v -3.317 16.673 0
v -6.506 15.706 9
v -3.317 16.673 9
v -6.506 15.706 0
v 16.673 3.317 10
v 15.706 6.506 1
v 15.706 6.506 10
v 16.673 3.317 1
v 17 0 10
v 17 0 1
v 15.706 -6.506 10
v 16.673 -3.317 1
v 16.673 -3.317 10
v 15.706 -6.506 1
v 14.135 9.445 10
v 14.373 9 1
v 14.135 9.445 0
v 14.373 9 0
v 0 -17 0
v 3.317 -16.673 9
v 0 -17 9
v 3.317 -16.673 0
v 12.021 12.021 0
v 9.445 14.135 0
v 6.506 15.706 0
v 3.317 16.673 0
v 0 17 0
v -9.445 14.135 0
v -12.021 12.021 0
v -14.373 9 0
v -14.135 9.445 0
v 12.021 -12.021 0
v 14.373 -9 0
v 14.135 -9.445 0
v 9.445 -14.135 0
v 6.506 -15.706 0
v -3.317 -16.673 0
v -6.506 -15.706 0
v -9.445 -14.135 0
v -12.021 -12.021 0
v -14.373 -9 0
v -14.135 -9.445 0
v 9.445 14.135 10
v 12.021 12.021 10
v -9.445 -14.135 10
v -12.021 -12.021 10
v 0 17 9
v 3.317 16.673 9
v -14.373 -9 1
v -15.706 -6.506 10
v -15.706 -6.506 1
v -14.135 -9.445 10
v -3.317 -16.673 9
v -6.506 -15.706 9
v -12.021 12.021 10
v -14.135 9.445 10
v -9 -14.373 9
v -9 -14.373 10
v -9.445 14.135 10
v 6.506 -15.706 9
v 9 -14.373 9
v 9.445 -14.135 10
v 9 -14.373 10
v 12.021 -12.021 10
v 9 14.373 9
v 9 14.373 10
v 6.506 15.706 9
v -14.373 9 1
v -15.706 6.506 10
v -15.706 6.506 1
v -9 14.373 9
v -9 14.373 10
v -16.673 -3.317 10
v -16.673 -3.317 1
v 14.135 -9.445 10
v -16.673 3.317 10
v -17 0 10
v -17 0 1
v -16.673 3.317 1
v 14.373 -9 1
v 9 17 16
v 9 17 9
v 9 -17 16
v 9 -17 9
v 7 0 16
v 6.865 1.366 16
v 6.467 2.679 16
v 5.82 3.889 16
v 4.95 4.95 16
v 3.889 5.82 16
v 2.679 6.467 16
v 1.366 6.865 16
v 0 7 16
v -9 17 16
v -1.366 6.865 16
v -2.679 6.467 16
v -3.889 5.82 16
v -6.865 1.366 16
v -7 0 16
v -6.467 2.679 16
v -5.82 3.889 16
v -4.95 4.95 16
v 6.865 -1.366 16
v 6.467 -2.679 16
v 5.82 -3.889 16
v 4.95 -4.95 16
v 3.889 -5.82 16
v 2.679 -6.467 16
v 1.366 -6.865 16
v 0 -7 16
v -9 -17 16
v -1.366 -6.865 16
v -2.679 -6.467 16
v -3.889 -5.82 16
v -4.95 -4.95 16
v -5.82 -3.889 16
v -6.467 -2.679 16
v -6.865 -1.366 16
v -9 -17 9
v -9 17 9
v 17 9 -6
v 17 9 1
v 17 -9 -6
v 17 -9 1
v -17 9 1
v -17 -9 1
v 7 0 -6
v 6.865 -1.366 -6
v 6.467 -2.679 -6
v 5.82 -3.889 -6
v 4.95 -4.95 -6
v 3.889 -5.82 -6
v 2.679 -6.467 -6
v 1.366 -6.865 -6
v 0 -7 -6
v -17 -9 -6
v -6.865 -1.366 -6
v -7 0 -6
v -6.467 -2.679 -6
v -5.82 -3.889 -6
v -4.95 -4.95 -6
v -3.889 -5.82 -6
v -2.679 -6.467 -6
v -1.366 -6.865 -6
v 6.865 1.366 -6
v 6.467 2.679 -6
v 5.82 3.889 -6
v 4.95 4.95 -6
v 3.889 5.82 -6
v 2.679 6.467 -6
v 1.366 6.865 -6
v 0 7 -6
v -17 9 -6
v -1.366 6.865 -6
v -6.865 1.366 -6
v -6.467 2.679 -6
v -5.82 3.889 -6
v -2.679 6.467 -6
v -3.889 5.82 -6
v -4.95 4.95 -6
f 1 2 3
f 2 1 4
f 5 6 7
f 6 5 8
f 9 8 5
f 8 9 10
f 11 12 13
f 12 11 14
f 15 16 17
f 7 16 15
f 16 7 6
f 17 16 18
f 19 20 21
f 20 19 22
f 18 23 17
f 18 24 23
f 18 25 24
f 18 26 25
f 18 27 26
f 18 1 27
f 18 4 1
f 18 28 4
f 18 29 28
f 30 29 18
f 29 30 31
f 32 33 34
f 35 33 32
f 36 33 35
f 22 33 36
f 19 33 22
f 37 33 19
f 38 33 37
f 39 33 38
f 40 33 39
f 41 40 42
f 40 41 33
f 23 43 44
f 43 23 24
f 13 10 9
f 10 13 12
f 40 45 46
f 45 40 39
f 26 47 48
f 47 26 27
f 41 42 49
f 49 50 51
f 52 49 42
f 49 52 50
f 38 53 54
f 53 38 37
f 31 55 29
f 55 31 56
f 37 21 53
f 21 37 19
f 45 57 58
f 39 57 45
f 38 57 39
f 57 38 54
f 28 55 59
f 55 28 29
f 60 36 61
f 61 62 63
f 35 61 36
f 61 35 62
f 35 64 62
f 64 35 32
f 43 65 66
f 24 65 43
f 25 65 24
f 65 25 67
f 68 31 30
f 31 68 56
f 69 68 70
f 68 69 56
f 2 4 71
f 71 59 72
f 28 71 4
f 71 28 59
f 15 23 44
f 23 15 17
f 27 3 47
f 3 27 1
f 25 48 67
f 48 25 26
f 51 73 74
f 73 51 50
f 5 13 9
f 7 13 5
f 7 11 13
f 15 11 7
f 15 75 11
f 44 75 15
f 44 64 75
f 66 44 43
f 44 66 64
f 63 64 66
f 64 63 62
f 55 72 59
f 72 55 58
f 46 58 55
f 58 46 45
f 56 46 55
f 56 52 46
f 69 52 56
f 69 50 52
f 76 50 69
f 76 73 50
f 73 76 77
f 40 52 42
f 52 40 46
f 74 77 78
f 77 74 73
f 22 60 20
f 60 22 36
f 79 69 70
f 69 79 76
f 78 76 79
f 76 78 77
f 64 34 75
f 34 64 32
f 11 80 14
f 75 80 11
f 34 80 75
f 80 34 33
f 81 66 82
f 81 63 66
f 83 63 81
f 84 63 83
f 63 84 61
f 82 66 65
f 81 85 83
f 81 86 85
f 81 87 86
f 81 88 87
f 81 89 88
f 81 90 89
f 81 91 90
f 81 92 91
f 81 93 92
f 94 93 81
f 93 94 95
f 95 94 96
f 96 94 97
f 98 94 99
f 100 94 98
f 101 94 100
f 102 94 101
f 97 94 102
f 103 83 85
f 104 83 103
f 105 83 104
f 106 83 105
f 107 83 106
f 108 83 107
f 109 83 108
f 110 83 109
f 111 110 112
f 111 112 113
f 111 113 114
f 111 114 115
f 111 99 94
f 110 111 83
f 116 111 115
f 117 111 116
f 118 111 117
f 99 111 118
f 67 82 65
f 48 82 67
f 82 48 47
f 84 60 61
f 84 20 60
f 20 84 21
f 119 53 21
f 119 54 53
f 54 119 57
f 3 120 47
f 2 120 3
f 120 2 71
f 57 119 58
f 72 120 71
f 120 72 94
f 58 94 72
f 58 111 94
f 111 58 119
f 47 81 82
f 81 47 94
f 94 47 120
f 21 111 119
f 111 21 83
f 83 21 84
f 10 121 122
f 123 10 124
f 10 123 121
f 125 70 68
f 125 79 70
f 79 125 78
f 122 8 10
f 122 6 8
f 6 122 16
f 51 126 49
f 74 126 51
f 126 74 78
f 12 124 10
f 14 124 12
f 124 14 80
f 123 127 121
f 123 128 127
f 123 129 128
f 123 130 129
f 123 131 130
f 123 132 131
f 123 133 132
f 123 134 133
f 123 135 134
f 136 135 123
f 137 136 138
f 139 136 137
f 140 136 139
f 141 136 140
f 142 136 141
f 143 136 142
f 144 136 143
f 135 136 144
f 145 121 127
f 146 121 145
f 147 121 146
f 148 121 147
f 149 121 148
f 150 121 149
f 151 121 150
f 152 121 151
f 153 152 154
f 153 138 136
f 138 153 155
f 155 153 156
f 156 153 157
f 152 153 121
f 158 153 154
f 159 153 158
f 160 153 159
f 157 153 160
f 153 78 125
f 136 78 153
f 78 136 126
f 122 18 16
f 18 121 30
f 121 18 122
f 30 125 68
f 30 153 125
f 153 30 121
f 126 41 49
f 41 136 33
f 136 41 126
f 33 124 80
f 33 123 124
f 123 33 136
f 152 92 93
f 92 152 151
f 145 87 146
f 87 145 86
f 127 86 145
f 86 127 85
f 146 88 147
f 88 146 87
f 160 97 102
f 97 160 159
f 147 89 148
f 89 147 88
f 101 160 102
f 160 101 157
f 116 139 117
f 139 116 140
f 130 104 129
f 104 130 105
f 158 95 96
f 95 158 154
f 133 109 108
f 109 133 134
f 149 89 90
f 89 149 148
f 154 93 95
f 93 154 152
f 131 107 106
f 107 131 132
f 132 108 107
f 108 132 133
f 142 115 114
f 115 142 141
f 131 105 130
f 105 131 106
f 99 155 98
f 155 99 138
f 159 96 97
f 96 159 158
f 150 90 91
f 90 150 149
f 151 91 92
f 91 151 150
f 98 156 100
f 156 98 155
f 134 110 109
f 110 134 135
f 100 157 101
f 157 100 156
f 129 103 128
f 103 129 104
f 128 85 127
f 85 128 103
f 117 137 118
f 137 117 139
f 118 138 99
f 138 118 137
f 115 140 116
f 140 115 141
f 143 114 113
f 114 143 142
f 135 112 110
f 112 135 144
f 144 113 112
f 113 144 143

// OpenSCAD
$fn = 32;
// ----------------------------------------------------------------------
// Oldham coupling disc: 34 x 22 mm
// ----------------------------------------------------------------------

// --- parameters (mm) ---
disc_d = 34;              // disc diameter
disc_t = 10;              // disc thickness
tongue_w = 18;            // tongue width
tongue_h = 6;             // tongue height
bore_d = 14;              // centre lightening bore

module disc() {
  cylinder(h = disc_t, d = disc_d);
  /* tongue on the top face, sunk 1 mm into the disc */
  translate([-tongue_w / 2, -disc_d / 2, disc_t - 1]) cube([tongue_w, disc_d, tongue_h + 1]);
  /* slot wall on the bottom face, 90 degrees turned */
  translate([-disc_d / 2, -tongue_w / 2, -tongue_h]) cube([disc_d, tongue_w, tongue_h + 1]);
}

difference() {
  disc();
  translate([0, 0, -tongue_h - 1]) cylinder(h = disc_t + 2 * tongue_h + 2, d = bore_d);
}
